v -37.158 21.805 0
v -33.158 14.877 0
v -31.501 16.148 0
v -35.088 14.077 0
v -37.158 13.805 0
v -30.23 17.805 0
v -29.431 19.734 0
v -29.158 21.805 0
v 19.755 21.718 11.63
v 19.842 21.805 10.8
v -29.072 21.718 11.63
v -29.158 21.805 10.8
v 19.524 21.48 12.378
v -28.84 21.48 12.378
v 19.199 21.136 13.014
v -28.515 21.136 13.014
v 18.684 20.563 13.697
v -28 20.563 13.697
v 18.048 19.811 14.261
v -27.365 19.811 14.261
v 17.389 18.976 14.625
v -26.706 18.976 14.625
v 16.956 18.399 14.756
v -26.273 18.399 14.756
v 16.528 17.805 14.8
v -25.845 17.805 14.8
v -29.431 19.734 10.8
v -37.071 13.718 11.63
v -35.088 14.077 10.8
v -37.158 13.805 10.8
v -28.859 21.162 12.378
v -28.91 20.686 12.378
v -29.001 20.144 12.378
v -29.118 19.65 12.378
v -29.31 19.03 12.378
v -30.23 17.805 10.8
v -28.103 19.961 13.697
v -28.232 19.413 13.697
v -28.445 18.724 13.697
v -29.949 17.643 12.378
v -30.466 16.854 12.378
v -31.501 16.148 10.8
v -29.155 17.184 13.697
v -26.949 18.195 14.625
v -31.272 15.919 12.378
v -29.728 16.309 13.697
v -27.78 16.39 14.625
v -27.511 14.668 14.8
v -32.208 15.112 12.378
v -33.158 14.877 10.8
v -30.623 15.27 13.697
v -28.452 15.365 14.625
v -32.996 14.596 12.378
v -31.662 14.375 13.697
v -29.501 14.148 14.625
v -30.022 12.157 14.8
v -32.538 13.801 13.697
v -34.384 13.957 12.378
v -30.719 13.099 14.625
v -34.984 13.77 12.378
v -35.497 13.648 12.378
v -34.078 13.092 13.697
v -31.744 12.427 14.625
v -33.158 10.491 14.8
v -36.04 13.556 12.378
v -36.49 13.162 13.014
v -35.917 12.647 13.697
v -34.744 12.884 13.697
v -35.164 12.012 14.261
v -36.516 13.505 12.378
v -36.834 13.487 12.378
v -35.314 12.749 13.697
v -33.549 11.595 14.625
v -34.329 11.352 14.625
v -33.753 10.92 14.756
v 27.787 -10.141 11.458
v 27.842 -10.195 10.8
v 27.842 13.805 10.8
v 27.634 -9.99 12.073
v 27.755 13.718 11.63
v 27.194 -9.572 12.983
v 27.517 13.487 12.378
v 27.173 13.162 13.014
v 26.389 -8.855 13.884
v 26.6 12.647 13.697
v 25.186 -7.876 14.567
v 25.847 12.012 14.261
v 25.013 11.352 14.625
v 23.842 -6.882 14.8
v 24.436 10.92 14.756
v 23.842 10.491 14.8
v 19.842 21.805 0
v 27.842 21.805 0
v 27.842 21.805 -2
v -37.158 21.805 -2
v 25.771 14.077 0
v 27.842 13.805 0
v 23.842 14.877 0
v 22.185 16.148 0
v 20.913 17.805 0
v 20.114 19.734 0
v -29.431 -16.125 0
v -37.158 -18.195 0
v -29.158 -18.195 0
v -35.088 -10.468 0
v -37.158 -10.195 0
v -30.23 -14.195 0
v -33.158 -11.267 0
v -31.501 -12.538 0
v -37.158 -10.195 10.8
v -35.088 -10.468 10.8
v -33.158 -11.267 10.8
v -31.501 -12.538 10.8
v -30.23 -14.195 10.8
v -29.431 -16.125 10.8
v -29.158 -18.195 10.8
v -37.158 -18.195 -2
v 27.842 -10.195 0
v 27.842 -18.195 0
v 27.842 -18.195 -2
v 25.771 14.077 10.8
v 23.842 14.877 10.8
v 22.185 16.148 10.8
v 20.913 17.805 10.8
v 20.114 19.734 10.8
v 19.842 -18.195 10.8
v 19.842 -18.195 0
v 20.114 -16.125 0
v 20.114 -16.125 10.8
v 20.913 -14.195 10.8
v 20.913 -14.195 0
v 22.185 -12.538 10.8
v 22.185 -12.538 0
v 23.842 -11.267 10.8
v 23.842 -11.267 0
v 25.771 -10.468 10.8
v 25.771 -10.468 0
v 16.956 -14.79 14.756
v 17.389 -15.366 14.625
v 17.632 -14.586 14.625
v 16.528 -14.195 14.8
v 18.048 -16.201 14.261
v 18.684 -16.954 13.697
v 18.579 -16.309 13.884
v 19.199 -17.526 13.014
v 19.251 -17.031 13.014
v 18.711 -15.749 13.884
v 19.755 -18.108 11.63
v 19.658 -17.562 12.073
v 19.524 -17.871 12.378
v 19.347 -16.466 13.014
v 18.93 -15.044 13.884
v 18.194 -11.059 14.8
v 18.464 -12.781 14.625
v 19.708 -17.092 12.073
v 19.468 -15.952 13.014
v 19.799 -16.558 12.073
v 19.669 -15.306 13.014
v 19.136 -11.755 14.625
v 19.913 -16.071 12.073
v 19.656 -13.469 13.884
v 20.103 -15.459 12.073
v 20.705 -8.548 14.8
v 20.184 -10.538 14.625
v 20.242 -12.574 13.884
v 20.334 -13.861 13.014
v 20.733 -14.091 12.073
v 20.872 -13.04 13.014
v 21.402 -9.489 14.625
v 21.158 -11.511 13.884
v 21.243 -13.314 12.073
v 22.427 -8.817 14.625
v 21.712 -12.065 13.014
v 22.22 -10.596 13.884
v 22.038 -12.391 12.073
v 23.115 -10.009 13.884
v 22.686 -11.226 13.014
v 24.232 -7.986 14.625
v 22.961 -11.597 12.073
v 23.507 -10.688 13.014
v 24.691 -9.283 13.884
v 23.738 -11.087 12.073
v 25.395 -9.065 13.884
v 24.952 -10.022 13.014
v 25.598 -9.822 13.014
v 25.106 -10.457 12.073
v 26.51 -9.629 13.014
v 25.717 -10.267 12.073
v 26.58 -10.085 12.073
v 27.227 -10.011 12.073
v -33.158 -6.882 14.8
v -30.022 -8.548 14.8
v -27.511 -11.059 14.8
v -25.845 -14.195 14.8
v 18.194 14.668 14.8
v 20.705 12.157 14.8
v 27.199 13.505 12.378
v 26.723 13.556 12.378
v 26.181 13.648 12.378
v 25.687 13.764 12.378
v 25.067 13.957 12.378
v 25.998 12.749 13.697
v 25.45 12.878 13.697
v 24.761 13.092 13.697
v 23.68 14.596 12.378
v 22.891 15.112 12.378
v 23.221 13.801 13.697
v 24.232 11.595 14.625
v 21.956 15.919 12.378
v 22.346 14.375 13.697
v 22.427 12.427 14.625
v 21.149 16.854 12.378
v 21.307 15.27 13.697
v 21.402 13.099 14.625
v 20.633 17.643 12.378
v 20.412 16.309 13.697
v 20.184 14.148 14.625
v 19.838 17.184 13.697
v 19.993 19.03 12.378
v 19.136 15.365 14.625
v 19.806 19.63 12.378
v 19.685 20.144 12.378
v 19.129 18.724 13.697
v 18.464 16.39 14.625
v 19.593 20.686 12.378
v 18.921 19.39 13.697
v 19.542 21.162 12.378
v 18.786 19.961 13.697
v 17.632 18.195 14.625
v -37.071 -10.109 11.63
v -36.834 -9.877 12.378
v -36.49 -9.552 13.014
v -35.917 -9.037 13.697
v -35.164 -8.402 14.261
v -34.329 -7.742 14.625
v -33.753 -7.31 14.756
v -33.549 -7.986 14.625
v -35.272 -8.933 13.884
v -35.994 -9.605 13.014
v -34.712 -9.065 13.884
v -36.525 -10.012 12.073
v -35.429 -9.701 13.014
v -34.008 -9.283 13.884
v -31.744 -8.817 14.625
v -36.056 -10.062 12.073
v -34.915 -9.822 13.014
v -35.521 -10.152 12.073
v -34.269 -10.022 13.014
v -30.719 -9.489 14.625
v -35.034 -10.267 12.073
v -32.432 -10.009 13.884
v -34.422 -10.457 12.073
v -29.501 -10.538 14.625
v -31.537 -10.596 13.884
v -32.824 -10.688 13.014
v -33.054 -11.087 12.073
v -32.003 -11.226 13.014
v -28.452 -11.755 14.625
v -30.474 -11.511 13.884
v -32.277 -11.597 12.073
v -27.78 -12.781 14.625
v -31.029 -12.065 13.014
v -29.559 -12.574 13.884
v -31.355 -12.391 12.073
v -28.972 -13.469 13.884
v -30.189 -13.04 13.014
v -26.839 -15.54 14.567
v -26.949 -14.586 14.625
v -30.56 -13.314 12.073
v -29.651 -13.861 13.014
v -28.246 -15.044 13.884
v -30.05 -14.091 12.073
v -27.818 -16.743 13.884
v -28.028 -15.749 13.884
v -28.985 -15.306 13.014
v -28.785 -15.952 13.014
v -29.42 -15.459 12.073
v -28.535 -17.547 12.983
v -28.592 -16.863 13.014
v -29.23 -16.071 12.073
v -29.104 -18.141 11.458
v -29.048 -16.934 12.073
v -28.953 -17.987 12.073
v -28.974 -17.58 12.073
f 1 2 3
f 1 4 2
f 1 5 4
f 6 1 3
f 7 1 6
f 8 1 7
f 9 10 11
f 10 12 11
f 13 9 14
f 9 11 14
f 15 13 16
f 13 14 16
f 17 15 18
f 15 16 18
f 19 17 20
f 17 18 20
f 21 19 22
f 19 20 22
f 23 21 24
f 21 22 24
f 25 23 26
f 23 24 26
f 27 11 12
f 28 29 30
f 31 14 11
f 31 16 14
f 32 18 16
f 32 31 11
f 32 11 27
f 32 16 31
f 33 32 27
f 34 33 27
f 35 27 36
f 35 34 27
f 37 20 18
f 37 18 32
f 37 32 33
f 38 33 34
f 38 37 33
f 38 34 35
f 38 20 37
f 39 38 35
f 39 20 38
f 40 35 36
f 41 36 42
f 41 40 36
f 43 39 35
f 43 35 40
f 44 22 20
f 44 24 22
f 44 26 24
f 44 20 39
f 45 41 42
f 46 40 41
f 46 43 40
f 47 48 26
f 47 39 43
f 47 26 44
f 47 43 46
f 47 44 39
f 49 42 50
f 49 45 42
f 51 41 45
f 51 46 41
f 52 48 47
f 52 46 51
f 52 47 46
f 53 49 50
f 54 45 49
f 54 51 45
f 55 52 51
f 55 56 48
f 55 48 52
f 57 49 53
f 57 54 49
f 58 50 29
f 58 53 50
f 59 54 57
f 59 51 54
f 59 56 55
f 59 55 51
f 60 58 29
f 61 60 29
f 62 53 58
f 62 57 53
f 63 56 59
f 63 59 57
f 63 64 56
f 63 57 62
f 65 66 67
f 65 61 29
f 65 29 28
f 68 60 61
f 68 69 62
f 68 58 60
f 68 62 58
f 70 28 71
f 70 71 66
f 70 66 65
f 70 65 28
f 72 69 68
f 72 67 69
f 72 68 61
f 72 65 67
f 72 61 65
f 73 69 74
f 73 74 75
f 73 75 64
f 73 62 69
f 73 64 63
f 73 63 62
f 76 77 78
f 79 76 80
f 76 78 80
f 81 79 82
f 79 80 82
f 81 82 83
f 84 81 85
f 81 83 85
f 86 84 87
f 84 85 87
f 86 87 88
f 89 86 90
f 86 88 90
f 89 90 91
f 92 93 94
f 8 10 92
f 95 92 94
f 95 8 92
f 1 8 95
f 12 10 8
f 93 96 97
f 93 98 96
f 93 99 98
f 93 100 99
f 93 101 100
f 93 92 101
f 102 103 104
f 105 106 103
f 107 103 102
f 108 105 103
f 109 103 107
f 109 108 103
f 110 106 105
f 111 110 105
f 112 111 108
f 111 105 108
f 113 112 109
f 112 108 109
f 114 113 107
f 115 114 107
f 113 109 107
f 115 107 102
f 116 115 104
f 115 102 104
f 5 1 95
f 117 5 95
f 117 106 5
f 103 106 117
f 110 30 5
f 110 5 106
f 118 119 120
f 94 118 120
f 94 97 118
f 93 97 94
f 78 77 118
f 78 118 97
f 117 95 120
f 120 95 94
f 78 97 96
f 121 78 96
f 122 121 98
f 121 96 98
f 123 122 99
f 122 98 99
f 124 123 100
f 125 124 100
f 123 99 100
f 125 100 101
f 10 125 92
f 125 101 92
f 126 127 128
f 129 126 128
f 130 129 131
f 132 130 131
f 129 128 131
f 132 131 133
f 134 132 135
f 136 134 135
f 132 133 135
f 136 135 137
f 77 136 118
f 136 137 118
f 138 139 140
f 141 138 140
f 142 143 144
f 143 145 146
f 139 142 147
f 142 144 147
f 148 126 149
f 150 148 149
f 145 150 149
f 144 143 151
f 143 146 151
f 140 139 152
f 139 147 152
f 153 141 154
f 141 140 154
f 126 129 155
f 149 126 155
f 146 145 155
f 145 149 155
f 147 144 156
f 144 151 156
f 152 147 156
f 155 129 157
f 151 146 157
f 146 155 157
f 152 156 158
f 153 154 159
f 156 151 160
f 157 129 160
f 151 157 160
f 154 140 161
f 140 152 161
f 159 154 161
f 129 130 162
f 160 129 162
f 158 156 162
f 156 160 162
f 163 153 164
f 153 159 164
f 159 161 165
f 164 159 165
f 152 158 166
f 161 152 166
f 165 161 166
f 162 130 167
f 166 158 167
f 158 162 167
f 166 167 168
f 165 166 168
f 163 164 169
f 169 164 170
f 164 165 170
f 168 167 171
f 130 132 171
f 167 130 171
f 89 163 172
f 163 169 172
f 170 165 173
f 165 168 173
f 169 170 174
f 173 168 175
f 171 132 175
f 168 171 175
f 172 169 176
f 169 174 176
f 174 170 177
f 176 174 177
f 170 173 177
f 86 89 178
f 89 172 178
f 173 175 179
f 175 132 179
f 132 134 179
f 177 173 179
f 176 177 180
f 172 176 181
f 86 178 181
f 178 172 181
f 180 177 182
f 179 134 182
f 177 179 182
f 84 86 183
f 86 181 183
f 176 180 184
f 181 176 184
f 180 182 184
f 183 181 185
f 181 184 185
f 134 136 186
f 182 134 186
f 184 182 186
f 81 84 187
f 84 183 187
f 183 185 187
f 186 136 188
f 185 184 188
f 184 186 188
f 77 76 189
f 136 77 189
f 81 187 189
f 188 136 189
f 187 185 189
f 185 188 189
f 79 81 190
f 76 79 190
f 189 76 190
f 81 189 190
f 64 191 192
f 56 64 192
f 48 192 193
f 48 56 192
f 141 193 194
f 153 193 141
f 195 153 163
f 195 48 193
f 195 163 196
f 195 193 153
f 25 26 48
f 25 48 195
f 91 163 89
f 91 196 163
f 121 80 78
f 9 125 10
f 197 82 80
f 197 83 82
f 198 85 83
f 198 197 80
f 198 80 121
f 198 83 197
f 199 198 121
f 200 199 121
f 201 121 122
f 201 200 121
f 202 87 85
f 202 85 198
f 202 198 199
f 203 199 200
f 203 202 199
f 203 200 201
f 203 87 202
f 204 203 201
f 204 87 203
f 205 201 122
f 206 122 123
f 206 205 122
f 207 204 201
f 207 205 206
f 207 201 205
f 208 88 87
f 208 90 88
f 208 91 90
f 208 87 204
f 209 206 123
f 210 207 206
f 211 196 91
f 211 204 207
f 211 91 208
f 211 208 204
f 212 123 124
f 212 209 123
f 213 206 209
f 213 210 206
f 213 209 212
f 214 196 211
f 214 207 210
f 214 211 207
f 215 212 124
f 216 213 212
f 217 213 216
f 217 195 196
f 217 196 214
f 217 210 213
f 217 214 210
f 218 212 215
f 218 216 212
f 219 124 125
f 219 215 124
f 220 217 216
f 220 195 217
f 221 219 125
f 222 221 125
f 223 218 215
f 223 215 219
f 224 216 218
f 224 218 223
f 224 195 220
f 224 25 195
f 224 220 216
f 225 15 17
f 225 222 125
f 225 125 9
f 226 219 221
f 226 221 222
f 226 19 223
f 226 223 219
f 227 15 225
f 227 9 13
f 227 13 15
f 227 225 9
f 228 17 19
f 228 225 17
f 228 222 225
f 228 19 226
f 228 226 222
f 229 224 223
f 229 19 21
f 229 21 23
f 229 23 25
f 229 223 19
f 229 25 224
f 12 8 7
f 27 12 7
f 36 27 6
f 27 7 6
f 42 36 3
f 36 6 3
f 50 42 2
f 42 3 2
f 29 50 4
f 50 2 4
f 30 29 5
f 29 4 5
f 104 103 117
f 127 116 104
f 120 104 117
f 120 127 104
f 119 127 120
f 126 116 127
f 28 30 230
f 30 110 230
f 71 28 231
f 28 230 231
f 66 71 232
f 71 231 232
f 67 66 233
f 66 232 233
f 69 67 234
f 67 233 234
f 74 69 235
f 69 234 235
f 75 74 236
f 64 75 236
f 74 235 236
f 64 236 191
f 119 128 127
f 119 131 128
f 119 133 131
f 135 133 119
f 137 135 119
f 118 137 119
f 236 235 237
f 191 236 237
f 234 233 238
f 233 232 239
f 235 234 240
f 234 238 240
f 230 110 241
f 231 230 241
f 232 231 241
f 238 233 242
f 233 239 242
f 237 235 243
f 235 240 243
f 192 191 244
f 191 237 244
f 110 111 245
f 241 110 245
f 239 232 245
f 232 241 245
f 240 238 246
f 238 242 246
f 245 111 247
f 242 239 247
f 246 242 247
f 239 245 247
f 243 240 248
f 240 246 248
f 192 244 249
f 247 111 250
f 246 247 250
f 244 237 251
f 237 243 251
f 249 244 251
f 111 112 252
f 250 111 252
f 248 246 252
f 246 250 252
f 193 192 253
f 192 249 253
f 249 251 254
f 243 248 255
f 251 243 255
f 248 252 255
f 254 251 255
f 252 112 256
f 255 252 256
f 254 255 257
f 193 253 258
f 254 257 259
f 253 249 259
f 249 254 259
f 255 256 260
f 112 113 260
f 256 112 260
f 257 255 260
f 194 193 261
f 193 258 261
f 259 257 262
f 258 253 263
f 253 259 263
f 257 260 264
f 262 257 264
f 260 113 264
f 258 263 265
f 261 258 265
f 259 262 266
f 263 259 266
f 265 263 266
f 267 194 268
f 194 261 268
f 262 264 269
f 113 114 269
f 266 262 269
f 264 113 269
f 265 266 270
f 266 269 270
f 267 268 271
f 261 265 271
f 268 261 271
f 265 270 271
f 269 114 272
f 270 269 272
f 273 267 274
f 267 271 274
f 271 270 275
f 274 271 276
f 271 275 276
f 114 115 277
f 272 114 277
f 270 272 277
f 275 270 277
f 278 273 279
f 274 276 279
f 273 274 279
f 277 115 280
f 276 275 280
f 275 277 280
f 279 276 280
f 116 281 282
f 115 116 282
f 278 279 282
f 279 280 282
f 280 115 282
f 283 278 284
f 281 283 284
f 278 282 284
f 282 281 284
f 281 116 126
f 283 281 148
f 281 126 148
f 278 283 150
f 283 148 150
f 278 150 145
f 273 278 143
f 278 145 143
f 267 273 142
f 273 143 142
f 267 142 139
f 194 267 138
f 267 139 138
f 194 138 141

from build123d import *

# Parameters (mm, degrees)
BOSS_EXTRUDE1_DEPTH = 14.8
SKETCH1_3_W         = 65
SKETCH1_3_H         = 40
BOSS_EXTRUDE2_DEPTH = 2
FILLET1_R           = 4


with BuildPart() as part:
    # Sketch1 → Boss-Extrude1 (new body)
    with BuildSketch(Plane.XY):
        with BuildLine():
            ThreePointArc((-29.158352439, 21.804727646), (-31.501498189, 16.147873397), (-37.158352439, 13.804727646))
            Line((-37.158352439, 13.804727646), (-37.158352439, -10.195272354))
            ThreePointArc((-37.158352439, -10.195272354), (-31.501498189, -12.538418104), (-29.158352439, -18.195272354))
            Line((-29.158352439, -18.195272354), (19.841647561, -18.195272354))
            ThreePointArc((19.841647561, -18.195272354), (22.184793312, -12.538418104), (27.841647561, -10.195272354))
            Line((27.841647561, -10.195272354), (27.841647561, 13.804727646))
            ThreePointArc((27.841647561, 13.804727646), (22.184793312, 16.147873397), (19.841647561, 21.804727646))
            Line((19.841647561, 21.804727646), (-29.158352439, 21.804727646))
        make_face()
    extrude(amount=BOSS_EXTRUDE1_DEPTH)

    # Sketch1<3> → Boss-Extrude2 (add)
    with BuildSketch(Plane.XY):
        with Locations((-4.658352439, 1.804727646)):
            Rectangle(SKETCH1_3_W, SKETCH1_3_H)
    extrude(amount=-BOSS_EXTRUDE2_DEPTH)

    # Fillet1
    fillet1_edges = [part.edges().sort_by_distance(p)[0] for p in [
        (-4.658352439, -18.195272354, 14.8),
        (-31.501498189, -12.538418104, 14.8),
        (-37.158352439, 1.804727646, 14.8),
        (-31.501498189, 16.147873397, 14.8),
        (-4.658352439, 21.804727646, 14.8),
        (22.184793312, 16.147873397, 14.8),
        (27.841647561, 1.804727646, 14.8),
        (22.184793312, -12.538418104, 14.8),
    ]]
    fillet(fillet1_edges, radius=FILLET1_R)


solid = part.part
